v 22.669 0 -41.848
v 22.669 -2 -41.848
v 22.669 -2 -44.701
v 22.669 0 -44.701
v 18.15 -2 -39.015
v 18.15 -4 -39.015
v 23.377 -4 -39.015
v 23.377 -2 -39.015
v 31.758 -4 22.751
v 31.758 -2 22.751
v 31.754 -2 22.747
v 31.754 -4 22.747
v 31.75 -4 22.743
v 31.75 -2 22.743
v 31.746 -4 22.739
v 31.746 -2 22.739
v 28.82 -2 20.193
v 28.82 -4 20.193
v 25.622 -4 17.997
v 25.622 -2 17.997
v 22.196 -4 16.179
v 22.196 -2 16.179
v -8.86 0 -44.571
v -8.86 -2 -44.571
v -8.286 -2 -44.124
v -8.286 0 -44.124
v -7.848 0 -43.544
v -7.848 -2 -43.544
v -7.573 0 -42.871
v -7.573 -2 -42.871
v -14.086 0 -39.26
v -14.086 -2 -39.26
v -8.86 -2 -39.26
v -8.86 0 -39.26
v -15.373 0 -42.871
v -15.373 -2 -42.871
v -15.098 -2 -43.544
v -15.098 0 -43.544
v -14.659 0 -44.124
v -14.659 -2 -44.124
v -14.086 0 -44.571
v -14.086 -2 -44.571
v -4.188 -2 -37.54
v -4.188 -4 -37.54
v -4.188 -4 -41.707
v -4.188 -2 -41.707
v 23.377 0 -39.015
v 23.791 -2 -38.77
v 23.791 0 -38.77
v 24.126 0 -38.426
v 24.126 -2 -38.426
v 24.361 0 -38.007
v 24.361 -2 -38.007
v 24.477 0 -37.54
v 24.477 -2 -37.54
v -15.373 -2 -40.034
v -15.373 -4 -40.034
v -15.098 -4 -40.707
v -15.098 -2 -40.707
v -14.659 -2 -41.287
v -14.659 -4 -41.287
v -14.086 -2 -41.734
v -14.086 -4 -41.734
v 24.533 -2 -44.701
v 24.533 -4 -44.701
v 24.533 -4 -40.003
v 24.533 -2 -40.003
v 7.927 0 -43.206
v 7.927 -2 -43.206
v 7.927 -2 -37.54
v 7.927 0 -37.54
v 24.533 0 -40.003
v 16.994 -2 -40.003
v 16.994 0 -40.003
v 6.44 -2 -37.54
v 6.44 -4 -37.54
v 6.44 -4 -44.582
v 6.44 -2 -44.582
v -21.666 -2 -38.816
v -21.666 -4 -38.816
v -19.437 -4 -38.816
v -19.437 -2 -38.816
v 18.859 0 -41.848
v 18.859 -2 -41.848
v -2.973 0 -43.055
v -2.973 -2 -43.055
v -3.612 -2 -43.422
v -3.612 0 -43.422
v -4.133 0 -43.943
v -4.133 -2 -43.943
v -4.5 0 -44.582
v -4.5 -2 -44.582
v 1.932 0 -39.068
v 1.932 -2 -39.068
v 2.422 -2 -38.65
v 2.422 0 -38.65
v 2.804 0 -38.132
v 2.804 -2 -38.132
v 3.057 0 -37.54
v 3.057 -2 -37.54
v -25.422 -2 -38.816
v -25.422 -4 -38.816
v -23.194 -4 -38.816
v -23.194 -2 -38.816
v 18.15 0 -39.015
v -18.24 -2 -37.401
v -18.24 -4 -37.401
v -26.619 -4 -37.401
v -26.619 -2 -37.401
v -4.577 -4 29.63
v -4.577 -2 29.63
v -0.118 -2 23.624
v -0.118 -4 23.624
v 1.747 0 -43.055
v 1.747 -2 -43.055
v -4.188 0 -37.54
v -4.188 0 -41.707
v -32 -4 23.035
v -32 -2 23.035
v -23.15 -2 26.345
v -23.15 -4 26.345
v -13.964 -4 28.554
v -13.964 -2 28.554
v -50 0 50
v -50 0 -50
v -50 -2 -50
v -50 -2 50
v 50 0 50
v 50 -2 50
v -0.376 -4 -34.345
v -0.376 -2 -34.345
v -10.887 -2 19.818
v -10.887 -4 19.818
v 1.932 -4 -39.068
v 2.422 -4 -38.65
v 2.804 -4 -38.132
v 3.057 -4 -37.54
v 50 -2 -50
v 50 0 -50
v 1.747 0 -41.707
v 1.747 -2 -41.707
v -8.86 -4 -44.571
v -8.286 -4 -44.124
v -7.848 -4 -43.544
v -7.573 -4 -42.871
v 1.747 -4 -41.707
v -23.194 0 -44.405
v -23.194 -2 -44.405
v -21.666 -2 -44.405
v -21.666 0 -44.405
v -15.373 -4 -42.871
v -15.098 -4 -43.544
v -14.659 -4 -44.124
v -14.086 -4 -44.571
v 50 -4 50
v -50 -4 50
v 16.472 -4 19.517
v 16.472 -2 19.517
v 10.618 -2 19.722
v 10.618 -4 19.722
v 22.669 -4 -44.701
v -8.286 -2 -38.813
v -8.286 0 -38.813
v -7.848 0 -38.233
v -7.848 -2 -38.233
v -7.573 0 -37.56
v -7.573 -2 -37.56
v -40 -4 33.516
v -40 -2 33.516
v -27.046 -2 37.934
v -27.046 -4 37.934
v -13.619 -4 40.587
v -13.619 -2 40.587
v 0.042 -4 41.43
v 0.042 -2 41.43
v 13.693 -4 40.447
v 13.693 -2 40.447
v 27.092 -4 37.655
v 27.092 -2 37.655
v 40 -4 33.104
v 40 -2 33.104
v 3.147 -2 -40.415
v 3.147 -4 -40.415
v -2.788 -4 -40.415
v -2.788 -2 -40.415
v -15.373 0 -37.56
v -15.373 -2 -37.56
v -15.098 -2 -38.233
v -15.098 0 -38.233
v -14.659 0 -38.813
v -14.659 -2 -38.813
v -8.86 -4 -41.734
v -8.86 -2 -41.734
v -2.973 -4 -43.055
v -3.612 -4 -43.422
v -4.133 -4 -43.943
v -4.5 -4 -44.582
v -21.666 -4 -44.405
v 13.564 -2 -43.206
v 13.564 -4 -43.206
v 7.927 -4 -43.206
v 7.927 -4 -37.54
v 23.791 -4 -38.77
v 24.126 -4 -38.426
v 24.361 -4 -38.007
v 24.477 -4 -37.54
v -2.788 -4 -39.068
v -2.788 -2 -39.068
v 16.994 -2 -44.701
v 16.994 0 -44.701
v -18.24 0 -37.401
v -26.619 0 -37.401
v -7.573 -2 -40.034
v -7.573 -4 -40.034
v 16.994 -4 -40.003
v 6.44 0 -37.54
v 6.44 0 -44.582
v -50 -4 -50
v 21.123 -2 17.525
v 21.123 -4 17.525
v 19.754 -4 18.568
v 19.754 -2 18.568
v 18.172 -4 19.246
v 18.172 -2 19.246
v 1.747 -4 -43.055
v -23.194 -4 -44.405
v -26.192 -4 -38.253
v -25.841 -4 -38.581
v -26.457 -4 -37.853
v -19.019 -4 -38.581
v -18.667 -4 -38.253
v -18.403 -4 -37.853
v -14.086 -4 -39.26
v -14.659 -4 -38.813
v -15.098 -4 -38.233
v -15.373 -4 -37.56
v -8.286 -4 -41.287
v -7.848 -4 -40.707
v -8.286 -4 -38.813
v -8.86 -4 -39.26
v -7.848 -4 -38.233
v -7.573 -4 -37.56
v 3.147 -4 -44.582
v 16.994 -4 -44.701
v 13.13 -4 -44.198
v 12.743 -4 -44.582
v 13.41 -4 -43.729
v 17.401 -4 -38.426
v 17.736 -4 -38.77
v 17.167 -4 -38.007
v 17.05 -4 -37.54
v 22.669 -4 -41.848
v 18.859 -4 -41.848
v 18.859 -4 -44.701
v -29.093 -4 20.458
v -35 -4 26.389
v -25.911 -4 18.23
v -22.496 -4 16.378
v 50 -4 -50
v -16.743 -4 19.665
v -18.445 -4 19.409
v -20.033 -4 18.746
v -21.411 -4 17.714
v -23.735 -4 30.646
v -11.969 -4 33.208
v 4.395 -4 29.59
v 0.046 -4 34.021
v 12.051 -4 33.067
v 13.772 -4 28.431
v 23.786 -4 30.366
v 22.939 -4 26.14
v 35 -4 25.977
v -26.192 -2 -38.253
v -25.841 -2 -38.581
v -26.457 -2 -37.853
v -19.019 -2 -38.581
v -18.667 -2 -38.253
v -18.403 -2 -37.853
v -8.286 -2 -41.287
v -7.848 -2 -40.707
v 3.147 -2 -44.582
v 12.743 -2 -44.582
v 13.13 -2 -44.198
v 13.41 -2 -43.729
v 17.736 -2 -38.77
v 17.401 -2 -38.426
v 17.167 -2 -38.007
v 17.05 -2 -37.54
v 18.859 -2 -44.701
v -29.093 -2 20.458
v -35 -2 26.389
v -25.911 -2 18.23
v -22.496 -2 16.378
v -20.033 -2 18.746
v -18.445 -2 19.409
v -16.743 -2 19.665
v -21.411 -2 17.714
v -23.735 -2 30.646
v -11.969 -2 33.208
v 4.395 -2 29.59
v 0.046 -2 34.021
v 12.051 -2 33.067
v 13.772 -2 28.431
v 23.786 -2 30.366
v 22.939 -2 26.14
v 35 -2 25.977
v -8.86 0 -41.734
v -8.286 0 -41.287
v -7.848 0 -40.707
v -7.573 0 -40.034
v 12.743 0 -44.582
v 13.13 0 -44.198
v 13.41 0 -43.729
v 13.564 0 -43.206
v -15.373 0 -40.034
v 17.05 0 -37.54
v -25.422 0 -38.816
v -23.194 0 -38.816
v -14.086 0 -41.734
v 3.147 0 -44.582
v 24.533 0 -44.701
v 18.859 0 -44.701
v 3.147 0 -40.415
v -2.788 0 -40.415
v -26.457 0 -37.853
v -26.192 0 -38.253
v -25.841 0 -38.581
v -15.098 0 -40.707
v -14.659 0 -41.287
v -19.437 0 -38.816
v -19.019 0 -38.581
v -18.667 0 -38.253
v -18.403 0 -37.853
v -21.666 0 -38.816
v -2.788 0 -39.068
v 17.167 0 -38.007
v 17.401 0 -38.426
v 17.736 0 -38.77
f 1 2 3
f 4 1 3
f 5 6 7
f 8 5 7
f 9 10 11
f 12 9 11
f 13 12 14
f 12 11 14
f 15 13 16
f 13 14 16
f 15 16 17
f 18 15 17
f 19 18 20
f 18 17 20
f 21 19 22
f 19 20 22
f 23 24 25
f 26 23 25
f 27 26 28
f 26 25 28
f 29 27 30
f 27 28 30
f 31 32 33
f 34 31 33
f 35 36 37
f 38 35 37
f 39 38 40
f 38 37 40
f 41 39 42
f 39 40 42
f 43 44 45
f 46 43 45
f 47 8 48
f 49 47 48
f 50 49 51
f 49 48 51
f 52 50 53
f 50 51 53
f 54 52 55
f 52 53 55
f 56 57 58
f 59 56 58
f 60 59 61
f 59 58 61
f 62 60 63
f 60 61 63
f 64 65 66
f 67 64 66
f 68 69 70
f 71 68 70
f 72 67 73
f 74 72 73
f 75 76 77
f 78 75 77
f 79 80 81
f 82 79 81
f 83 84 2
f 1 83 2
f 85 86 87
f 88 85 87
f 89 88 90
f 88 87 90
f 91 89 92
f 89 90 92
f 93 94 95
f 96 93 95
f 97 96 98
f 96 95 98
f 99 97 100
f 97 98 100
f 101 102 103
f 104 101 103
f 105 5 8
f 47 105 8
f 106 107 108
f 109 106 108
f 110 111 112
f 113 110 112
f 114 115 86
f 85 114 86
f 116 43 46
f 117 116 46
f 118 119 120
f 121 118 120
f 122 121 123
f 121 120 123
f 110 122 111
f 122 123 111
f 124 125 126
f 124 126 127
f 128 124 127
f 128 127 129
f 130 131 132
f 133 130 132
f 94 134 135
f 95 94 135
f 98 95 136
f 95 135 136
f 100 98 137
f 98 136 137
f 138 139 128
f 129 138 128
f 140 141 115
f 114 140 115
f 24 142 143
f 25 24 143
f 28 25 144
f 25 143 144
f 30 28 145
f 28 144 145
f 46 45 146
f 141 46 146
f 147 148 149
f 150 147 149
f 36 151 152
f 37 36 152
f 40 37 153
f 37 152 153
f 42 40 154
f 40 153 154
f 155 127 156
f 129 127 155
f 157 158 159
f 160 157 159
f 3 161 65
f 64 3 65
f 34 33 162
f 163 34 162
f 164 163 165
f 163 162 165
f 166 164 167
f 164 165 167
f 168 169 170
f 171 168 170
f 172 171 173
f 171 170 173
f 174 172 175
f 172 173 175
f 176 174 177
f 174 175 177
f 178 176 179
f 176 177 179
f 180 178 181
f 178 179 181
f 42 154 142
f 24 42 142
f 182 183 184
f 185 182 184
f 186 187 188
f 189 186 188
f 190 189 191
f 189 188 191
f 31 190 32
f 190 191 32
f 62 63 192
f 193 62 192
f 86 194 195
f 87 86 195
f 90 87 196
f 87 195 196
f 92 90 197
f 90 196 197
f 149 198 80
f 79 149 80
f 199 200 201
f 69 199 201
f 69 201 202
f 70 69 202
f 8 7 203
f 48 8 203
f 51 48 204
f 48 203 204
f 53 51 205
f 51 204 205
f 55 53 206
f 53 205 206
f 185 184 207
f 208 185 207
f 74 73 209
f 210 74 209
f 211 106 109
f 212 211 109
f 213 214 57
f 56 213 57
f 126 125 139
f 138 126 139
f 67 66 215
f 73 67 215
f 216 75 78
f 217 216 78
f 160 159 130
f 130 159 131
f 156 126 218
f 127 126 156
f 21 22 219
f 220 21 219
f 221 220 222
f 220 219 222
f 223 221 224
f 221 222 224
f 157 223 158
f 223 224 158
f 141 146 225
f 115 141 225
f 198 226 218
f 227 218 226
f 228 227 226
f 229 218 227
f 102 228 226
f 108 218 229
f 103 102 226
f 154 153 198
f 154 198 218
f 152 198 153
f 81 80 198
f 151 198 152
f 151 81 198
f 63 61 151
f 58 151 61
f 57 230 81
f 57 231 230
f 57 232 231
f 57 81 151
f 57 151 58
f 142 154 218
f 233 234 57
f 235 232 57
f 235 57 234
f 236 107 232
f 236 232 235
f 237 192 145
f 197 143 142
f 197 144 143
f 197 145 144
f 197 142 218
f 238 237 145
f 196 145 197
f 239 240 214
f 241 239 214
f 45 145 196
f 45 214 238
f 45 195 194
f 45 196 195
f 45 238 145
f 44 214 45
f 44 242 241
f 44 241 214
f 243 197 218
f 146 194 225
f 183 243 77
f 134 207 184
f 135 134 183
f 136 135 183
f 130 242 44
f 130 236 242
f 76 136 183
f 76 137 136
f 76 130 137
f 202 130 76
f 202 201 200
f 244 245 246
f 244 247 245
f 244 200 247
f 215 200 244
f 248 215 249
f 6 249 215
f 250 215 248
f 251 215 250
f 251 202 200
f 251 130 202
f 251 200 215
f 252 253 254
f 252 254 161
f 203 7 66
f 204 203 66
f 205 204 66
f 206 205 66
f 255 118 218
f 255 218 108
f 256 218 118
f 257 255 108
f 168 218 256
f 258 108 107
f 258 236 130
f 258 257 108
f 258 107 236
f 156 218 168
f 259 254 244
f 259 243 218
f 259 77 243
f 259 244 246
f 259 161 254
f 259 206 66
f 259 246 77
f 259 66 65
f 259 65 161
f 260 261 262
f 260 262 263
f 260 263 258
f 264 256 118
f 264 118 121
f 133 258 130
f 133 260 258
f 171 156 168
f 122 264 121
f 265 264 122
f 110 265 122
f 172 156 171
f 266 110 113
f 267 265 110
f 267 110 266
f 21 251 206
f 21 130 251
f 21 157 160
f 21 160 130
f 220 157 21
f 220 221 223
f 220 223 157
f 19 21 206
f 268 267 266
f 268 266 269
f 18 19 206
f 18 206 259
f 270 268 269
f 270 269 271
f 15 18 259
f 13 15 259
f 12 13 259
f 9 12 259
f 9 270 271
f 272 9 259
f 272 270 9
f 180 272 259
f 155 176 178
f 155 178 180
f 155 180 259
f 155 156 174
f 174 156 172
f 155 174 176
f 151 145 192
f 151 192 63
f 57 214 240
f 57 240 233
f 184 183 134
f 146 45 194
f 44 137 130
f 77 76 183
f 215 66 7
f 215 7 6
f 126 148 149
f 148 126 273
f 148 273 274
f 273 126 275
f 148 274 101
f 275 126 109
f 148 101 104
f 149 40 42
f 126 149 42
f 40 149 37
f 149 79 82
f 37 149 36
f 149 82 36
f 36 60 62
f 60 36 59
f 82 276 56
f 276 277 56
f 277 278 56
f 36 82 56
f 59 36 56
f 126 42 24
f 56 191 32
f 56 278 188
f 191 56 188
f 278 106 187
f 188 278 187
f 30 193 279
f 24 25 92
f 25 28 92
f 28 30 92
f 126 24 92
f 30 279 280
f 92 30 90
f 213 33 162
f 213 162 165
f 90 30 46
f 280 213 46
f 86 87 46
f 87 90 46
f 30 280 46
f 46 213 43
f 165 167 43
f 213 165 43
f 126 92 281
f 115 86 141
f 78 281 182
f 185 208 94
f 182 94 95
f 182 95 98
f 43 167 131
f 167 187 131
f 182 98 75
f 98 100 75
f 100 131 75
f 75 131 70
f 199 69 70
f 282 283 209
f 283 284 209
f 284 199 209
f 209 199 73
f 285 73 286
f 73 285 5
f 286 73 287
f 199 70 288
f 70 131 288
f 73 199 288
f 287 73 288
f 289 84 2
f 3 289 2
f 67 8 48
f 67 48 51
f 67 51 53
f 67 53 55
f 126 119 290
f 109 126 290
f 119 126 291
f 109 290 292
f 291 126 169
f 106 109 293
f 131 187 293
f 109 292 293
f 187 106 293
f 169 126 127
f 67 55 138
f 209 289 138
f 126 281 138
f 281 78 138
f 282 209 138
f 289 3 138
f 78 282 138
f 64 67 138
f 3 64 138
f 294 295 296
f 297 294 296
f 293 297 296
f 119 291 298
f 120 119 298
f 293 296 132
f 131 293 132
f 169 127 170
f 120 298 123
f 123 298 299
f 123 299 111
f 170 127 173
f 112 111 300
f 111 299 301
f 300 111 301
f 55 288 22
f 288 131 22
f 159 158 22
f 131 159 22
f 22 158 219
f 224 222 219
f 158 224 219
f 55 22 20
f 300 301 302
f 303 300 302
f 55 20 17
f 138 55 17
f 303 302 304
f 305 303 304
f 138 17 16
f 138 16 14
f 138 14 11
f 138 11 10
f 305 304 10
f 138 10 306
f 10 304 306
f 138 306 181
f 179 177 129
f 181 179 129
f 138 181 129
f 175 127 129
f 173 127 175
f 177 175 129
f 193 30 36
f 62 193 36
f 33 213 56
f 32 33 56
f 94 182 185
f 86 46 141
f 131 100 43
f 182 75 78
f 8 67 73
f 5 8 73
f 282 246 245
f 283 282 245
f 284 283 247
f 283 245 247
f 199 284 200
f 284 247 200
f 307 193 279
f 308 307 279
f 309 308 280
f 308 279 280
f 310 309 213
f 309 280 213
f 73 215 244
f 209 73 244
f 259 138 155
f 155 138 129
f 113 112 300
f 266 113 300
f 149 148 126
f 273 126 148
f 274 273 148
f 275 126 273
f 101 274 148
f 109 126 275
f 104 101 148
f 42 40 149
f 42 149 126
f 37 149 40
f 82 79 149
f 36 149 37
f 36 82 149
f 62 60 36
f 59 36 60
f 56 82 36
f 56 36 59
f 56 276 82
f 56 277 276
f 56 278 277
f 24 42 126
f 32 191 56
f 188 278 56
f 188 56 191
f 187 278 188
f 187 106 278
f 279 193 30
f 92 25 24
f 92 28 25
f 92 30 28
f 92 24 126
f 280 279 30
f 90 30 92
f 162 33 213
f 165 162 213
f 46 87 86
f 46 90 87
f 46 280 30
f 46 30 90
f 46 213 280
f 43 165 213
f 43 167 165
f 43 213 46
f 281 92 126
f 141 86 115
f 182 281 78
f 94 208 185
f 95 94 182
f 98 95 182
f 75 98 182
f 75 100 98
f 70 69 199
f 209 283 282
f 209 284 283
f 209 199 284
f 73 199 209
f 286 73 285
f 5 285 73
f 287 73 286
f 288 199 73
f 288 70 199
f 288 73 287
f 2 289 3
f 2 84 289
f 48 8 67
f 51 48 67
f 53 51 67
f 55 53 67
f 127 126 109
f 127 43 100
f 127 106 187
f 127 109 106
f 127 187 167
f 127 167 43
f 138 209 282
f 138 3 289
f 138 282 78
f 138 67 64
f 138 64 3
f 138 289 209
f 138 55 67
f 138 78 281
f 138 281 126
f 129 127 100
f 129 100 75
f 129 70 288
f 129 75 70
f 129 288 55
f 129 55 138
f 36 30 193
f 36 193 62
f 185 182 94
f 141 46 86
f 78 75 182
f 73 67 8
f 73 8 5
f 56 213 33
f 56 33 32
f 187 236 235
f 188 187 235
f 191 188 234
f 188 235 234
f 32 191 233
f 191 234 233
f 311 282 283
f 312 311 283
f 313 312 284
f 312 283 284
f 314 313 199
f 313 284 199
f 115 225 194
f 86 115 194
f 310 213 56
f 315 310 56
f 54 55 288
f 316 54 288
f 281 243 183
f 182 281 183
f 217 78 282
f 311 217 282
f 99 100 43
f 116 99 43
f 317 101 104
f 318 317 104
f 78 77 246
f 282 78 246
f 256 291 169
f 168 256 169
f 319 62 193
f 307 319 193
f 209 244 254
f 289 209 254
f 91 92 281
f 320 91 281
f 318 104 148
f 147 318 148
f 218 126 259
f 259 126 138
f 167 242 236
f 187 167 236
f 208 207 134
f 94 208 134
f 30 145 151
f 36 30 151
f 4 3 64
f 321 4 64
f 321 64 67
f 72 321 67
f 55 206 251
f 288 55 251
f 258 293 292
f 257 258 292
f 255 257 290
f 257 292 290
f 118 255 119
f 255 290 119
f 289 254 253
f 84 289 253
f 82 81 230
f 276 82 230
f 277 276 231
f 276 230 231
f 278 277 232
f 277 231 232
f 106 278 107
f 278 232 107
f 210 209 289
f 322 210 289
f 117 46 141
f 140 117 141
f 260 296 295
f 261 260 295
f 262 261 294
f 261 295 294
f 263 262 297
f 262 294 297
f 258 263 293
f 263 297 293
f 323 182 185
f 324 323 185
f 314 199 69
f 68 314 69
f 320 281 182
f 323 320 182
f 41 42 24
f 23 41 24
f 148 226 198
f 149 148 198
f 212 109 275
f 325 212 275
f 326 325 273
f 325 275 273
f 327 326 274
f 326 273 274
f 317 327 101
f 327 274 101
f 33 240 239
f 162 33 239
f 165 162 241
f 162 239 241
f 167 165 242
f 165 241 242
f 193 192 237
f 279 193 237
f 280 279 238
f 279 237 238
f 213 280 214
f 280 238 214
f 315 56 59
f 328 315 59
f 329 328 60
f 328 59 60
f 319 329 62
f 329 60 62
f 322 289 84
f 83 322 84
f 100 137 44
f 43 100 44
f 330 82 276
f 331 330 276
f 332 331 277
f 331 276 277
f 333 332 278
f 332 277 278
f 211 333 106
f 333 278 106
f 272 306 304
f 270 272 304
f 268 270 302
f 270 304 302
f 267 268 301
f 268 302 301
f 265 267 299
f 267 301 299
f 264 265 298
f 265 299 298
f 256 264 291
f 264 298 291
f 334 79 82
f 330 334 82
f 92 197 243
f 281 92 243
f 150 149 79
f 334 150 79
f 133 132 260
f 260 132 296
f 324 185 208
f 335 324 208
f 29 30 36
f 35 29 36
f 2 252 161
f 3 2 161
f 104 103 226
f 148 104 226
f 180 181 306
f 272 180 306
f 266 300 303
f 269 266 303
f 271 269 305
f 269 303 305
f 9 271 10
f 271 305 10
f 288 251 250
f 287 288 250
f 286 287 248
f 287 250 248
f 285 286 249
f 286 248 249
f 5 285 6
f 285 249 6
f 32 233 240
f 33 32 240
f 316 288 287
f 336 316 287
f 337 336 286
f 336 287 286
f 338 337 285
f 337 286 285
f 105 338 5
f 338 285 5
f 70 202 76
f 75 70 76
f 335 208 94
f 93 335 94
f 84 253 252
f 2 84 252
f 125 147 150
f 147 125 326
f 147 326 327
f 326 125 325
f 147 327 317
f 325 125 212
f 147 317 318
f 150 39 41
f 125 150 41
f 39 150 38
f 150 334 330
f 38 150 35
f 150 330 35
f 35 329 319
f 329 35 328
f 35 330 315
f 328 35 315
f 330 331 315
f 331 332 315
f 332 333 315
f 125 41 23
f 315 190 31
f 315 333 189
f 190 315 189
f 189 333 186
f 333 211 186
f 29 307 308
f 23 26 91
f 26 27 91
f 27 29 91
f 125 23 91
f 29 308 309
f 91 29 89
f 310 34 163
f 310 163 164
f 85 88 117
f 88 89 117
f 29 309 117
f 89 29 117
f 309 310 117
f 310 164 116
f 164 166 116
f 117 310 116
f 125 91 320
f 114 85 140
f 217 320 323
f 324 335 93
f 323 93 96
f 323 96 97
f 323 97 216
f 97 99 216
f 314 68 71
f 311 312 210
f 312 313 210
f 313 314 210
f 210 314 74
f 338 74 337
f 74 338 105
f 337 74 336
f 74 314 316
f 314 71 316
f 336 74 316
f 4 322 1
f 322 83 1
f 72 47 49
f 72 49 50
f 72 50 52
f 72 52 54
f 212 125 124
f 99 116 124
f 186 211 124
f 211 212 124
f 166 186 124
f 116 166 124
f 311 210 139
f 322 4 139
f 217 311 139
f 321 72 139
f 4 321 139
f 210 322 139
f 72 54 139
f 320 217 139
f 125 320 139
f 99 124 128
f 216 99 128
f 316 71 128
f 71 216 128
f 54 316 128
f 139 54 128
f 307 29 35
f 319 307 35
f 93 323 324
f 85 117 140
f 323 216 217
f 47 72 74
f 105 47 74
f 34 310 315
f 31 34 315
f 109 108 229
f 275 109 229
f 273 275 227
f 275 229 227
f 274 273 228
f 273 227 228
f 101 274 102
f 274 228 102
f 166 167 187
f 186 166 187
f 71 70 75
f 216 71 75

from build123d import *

# Parameters (mm, degrees)
F0_W     = 100
F0_H     = 100
F1_DEPTH = 2
F2_W     = 100
F2_H     = 100
F3_DEPTH = 2
F5_DEPTH = 10


with BuildPart() as f1:
    # F0 (on Front) → F1 (new body)
    with BuildSketch(Plane.XZ):
        Rectangle(F0_W, F0_H)
    extrude(amount=F1_DEPTH)


with BuildPart() as f3:
    # F2 (on face) → F3 (new body)
    with BuildSketch(Plane.XZ.offset(2)):
        Rectangle(F2_W, F2_H)
        with BuildLine():
            ThreePointArc((-22.496123, 16.377952), (-27.533795, 19.298471), (-32, 23.034858))
            ThreePointArc((-32, 23.034858), (-18.590811, 27.58958), (-4.57697, 29.630187))
            Line((-4.57697, 29.630187), (-0.117529, 23.624356))
            Line((-0.117529, 23.624356), (4.395257, 29.590207))
            ThreePointArc((4.395257, 29.590207), (18.390357, 27.424793), (31.758422, 22.750752))
            ThreePointArc((31.758422, 22.750752), (31.752454, 22.744927), (31.746485, 22.739104))
            ThreePointArc((31.746485, 22.739104), (27.252223, 19.049593), (22.195598, 16.178807))
            ThreePointArc((22.195598, 16.178807), (19.753952, 18.568273), (16.472125, 19.517373))
            Line((16.472125, 19.517373), (10.617825, 19.722229))
            Line((10.617825, 19.722229), (-0.37584, -34.345129))
            Line((-0.37584, -34.345129), (-10.887232, 19.818055))
            Line((-10.887232, 19.818055), (-16.743125, 19.665379))
            ThreePointArc((-16.743125, 19.665379), (-20.03328, 18.745564), (-22.496123, 16.377952))
        make_face(mode=Mode.SUBTRACT)
        with BuildLine():
            ThreePointArc((-40, 33.516364), (0.041817, 41.42999), (40, 33.10436))
            Line((40, 33.10436), (35, 25.976955))
            ThreePointArc((35, 25.976955), (0.046133, 34.020994), (-35, 26.38896))
            Line((-35, 26.38896), (-40, 33.516364))
        make_face(mode=Mode.SUBTRACT)
    extrude(amount=F3_DEPTH)


with BuildPart() as f5_tool:
    # F4 (on face) → F5 (new body)
    with BuildSketch(Plane.XZ.offset(4)):
        with BuildLine():
            Line((-18.240365, -37.401031), (-26.619467, -37.401031))
            ThreePointArc((-26.619467, -37.401031), (-26.192441, -38.253458), (-25.422453, -38.815686))
            Line((-25.422453, -38.815686), (-23.19389, -38.815686))
            Line((-23.19389, -38.815686), (-23.19389, -44.404685))
            Line((-23.19389, -44.404685), (-22.429916, -44.404685))
            Line((-22.429916, -44.404685), (-21.665942, -44.404685))
            Line((-21.665942, -44.404685), (-21.665942, -38.815686))
            Line((-21.665942, -38.815686), (-19.43738, -38.815686))
            ThreePointArc((-19.43738, -38.815686), (-18.667391, -38.253458), (-18.240365, -37.401031))
        make_face()
        with BuildLine():
            Line((-11.472773, -37.559853), (-15.372773, -37.559853))
            ThreePointArc((-15.372773, -37.559853), (-14.897399, -38.537163), (-14.085712, -39.259853))
            Line((-14.085712, -39.259853), (-11.472773, -39.259853))
            Line((-11.472773, -39.259853), (-8.859835, -39.259853))
            ThreePointArc((-8.859835, -39.259853), (-8.048148, -38.537163), (-7.572773, -37.559853))
            Line((-7.572773, -37.559853), (-11.472773, -37.559853))
        make_face()
        with BuildLine():
            Line((-11.472773, -40.034259), (-15.372773, -40.034259))
            ThreePointArc((-15.372773, -40.034259), (-14.897399, -41.01157), (-14.085712, -41.734259))
            Line((-14.085712, -41.734259), (-11.472773, -41.734259))
            Line((-11.472773, -41.734259), (-8.859835, -41.734259))
            ThreePointArc((-8.859835, -41.734259), (-8.048148, -41.01157), (-7.572773, -40.034259))
            Line((-7.572773, -40.034259), (-11.472773, -40.034259))
        make_face()
        with BuildLine():
            Line((-11.472773, -42.871185), (-15.372773, -42.871185))
            ThreePointArc((-15.372773, -42.871185), (-14.897399, -43.848496), (-14.085712, -44.571185))
            Line((-14.085712, -44.571185), (-11.472773, -44.571185))
            Line((-11.472773, -44.571185), (-8.859835, -44.571185))
            ThreePointArc((-8.859835, -44.571185), (-8.048148, -43.848496), (-7.572773, -42.871185))
            Line((-7.572773, -42.871185), (-11.472773, -42.871185))
        make_face()
        with BuildLine():
            ThreePointArc((1.932252, -39.067592), (2.627765, -38.402056), (3.056768, -37.540294))
            Line((3.056768, -37.540294), (-4.187748, -37.540294))
            Line((-4.187748, -37.540294), (-4.187748, -41.707016))
            Line((-4.187748, -41.707016), (1.746776, -41.707016))
            Line((1.746776, -41.707016), (1.746776, -43.0546))
            Line((1.746776, -43.0546), (-2.973224, -43.0546))
            ThreePointArc((-2.973224, -43.0546), (-3.889615, -43.665179), (-4.499701, -44.581897))
            Line((-4.499701, -44.581897), (3.146776, -44.581897))
            Line((3.146776, -44.581897), (3.146776, -40.415176))
            Line((3.146776, -40.415176), (-2.787748, -40.415176))
            Line((-2.787748, -40.415176), (-2.787748, -39.067592))
            Line((-2.787748, -39.067592), (1.932252, -39.067592))
        make_face()
        with BuildLine():
            Line((7.926718, -37.540294), (6.4395, -37.540294))
            Line((6.4395, -37.540294), (6.4395, -44.581897))
            Line((6.4395, -44.581897), (12.74251, -44.581897))
            ThreePointArc((12.74251, -44.581897), (13.284445, -43.972115), (13.564029, -43.205719))
            Line((13.564029, -43.205719), (7.926718, -43.205719))
            Line((7.926718, -43.205719), (7.926718, -37.540294))
        make_face()
        Polygon((24.532836, -40.002692), (20.763628, -40.002692), (16.99442, -40.002692), (16.99442, -44.700727), (18.858718, -44.700727), (18.858718, -41.84835), (20.763628, -41.84835), (22.668539, -41.84835), (22.668539, -44.700727), (24.532836, -44.700727), align=None)
        with BuildLine():
            Line((20.763628, -37.540294), (17.050337, -37.540294))
            ThreePointArc((17.050337, -37.540294), (17.40084, -38.426274), (18.150285, -39.014615))
            Line((18.150285, -39.014615), (20.763628, -39.014615))
            Line((20.763628, -39.014615), (23.376971, -39.014615))
            ThreePointArc((23.376971, -39.014615), (24.126417, -38.426274), (24.476919, -37.540294))
            Line((24.476919, -37.540294), (20.763628, -37.540294))
        make_face()
    extrude(amount=-F5_DEPTH)


with BuildPart() as f1_1:
    add(f1.part)

    # F5: cut by f5_tool
    add(f5_tool.part, mode=Mode.SUBTRACT)


with BuildPart() as f3_1:
    add(f3.part)

    # F5: cut by f5_tool
    add(f5_tool.part, mode=Mode.SUBTRACT)


solid = Compound([f1_1.part, f3_1.part])
